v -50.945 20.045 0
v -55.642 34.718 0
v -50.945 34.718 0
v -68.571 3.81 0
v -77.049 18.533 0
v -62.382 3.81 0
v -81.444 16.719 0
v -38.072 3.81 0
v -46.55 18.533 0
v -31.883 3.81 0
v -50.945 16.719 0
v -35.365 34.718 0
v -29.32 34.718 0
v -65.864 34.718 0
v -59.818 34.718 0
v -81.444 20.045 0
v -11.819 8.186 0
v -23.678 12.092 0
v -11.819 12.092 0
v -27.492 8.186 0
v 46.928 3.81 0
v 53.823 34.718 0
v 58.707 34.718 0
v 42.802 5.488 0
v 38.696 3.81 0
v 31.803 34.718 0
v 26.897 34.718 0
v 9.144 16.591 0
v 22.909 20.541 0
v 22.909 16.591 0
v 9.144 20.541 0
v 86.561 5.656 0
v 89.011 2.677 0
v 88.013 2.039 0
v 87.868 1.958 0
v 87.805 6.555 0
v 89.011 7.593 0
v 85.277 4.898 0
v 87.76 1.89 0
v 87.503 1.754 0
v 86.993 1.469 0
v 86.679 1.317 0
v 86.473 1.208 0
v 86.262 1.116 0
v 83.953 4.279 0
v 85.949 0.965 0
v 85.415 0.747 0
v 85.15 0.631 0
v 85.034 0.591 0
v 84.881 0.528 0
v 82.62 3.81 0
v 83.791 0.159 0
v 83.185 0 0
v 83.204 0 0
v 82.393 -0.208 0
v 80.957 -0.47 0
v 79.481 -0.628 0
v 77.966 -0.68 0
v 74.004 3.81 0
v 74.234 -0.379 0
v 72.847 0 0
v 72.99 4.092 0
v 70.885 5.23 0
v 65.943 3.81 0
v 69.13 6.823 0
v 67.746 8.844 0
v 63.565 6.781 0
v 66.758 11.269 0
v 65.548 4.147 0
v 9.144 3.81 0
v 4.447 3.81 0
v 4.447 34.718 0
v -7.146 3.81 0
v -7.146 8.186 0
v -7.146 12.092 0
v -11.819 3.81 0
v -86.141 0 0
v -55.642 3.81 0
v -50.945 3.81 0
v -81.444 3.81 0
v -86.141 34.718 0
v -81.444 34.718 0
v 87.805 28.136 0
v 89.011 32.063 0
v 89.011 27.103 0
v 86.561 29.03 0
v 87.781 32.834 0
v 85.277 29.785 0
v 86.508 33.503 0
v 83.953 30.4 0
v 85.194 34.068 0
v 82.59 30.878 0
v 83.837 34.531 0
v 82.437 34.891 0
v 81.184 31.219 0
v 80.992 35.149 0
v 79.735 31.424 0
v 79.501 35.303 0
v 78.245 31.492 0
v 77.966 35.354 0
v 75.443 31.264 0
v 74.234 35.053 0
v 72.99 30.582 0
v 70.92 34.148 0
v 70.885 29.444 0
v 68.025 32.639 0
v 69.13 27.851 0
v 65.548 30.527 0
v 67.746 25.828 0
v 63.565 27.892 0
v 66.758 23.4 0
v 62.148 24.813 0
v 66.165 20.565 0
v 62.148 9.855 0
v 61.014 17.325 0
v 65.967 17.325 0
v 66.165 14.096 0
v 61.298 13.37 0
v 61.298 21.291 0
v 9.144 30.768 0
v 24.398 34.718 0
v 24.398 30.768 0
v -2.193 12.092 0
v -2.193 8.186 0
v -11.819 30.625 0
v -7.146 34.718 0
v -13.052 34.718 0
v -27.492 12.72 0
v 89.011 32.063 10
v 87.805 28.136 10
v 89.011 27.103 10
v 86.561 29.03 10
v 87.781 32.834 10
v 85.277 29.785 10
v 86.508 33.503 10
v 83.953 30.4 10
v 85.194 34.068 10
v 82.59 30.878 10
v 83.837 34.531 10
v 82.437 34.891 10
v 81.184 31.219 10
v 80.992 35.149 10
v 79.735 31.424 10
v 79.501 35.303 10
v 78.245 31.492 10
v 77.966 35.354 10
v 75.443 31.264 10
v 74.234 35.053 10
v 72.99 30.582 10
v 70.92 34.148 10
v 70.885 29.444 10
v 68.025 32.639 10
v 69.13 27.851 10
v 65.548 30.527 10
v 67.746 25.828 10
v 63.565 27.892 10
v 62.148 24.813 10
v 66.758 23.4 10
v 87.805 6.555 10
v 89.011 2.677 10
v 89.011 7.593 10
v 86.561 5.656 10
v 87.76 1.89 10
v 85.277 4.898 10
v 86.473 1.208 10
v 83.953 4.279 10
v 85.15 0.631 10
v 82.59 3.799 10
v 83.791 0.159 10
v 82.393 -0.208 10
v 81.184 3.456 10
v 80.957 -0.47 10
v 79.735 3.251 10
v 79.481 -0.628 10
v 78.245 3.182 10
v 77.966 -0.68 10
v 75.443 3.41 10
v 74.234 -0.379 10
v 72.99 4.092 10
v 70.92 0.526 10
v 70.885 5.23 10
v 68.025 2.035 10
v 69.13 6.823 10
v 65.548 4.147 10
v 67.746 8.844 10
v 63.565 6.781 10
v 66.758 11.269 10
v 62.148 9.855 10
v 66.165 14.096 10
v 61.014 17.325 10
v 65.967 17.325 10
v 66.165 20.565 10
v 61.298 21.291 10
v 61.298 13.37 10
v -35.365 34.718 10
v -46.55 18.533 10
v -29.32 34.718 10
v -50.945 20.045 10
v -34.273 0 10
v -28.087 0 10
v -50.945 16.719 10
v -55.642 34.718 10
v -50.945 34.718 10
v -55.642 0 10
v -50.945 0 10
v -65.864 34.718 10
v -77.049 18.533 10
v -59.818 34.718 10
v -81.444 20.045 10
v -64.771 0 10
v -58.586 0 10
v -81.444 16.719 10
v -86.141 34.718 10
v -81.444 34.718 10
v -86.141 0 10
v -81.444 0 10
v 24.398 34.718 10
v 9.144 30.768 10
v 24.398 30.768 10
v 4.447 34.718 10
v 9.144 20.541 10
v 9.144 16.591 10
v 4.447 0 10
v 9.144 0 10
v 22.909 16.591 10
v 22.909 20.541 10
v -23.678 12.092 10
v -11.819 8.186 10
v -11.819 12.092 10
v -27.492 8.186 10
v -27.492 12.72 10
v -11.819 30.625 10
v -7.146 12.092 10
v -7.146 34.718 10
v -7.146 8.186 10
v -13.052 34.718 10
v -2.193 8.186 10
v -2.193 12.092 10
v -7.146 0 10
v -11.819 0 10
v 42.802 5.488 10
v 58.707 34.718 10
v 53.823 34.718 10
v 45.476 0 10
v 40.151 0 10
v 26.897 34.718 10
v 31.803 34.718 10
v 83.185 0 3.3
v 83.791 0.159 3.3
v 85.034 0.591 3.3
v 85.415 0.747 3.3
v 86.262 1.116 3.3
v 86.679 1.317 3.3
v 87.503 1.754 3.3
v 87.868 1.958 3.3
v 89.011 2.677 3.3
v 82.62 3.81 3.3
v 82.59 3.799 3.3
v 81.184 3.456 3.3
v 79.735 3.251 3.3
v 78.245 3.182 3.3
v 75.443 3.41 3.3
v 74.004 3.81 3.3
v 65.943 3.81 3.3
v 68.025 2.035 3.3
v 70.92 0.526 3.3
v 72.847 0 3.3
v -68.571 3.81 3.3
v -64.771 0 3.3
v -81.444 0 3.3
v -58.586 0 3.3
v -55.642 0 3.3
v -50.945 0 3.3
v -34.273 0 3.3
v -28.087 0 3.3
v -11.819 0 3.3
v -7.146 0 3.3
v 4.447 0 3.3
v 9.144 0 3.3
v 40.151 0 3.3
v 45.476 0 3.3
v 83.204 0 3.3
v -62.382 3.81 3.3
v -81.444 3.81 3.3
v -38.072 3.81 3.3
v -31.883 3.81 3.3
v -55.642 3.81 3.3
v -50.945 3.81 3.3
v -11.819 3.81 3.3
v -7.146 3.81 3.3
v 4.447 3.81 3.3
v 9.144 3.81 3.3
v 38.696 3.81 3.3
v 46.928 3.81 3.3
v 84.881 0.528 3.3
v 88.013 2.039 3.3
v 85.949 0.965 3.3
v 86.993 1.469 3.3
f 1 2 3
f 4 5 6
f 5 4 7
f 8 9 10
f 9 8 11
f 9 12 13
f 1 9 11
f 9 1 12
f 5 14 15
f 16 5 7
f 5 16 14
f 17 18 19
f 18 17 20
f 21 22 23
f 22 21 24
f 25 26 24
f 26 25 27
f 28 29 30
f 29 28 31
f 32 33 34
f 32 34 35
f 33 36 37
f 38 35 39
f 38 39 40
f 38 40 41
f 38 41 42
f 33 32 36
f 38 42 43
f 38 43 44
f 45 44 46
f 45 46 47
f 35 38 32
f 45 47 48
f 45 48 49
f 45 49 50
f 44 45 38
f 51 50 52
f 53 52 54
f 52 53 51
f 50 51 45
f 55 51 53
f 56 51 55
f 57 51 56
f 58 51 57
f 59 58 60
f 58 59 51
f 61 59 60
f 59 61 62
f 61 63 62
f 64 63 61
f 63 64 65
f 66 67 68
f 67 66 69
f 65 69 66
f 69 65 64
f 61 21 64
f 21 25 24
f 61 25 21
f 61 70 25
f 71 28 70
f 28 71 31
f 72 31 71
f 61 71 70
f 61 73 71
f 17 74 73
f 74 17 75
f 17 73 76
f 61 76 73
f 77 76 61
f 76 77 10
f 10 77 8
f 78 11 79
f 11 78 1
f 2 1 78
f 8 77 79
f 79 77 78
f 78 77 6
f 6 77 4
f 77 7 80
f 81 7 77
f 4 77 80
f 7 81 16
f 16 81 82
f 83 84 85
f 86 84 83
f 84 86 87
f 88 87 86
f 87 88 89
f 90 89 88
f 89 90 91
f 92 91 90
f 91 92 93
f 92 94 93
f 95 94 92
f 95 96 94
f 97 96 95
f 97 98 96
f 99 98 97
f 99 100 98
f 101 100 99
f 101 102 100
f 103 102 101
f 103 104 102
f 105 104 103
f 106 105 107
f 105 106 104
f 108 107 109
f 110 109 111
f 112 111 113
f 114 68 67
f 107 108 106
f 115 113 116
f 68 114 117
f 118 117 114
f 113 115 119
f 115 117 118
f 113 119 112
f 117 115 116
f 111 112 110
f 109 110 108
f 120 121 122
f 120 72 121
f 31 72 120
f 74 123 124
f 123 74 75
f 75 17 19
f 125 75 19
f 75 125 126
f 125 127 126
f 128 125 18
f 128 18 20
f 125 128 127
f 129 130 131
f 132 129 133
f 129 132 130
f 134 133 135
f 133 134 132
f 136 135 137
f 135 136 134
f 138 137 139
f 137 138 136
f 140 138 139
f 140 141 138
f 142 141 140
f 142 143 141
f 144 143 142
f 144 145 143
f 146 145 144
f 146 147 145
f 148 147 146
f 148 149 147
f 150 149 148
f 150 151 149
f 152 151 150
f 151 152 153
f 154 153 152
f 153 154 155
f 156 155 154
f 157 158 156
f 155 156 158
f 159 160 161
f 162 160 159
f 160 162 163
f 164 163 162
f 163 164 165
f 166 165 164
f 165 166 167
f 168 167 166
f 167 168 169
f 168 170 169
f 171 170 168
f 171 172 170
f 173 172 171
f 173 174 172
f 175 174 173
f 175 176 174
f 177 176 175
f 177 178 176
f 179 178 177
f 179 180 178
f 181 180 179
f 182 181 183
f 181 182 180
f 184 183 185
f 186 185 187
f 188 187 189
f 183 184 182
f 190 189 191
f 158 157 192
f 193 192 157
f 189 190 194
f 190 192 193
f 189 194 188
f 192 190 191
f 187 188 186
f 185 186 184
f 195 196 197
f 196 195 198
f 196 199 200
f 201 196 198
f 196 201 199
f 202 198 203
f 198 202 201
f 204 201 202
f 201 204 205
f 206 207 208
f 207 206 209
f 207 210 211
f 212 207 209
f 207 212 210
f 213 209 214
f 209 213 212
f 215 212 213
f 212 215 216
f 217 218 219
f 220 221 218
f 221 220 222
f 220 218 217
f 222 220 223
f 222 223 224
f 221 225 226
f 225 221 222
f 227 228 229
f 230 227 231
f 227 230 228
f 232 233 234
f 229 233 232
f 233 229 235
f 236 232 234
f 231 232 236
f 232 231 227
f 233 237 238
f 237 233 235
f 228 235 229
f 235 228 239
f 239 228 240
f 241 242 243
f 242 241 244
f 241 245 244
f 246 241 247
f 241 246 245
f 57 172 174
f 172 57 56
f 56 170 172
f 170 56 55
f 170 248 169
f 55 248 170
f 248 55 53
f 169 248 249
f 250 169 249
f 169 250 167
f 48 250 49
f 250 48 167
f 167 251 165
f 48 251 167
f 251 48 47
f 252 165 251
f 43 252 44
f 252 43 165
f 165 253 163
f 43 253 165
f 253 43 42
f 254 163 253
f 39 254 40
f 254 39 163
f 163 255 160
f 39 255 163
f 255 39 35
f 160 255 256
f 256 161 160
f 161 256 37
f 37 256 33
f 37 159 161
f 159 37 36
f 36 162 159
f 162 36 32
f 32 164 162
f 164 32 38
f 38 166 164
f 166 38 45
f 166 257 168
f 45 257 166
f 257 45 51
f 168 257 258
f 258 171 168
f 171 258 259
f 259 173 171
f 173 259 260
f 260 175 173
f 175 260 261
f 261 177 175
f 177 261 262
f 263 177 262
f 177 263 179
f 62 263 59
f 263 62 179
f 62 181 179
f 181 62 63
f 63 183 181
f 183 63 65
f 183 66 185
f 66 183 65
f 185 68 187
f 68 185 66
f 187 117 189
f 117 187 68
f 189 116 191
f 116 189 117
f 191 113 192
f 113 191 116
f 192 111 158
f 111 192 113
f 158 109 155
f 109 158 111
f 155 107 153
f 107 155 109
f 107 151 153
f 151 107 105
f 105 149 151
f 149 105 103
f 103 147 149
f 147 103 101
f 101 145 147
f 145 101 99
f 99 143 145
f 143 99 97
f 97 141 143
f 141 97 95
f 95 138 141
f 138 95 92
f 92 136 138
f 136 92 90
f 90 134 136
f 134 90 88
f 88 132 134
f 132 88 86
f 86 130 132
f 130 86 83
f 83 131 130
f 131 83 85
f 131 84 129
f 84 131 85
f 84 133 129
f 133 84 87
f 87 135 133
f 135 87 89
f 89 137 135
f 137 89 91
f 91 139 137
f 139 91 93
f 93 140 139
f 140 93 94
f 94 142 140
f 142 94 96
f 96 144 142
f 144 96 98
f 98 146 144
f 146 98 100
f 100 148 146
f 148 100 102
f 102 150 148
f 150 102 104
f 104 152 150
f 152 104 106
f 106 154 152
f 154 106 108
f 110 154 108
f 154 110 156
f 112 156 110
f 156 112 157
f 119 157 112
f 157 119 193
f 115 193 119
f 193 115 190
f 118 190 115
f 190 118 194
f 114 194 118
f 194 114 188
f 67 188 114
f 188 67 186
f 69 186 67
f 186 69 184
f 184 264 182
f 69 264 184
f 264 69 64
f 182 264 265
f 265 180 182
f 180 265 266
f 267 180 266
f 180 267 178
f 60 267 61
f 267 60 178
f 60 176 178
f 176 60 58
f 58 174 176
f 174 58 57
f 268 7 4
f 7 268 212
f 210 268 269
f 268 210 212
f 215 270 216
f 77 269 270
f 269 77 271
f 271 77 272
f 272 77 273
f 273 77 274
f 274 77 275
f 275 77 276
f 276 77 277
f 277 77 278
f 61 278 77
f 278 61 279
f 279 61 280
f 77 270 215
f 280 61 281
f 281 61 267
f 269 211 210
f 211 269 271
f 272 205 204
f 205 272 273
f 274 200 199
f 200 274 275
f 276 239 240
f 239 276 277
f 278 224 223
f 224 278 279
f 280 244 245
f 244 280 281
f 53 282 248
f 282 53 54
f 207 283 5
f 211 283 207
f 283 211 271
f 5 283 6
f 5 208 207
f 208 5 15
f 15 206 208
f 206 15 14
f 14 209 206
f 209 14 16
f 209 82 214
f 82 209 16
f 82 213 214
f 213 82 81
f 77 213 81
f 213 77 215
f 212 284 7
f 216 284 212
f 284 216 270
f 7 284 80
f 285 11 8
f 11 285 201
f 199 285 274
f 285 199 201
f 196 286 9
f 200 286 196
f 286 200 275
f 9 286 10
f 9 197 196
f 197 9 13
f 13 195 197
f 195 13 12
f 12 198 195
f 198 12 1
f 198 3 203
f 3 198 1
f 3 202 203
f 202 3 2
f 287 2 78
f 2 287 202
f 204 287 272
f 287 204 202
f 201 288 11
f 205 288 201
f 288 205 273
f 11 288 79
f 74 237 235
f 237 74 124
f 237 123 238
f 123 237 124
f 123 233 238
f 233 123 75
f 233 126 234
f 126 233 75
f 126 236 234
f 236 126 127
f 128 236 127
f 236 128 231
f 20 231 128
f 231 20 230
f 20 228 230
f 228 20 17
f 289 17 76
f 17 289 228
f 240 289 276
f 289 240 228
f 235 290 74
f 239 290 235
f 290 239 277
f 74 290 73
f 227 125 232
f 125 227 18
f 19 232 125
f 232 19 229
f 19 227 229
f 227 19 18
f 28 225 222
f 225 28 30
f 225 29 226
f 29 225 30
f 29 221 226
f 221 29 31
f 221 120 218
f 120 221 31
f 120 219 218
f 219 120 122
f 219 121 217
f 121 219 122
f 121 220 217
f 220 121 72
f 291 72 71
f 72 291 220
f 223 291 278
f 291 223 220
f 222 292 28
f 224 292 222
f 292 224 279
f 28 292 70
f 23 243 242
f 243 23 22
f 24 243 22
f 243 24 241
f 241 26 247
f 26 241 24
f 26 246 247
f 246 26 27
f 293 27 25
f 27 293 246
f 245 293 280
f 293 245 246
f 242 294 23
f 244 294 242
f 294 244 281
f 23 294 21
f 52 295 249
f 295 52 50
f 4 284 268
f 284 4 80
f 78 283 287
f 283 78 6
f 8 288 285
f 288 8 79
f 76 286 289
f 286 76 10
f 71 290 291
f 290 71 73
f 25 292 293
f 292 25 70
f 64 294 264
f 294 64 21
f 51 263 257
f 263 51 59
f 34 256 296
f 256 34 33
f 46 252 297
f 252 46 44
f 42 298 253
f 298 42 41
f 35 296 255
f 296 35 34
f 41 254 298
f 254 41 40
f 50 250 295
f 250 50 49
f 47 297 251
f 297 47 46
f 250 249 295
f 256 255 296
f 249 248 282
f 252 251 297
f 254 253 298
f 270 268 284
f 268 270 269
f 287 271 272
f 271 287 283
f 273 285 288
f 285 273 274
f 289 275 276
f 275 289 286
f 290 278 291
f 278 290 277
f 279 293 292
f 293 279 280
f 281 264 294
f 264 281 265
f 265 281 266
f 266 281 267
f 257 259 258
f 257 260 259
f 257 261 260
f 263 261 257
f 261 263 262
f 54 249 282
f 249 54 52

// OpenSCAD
//Set the text to render
textstring="KK4FVC";

//Font name, e.g. "Libration Sans", "Aldo", depends on what is available on the platform. In the customizer,choose from about 700 Google Fonts. For an overview please refer: http://www.google.com/fonts
fontname="Passion One"; //[ABeeZee,Abel,Abril Fatface,Aclonica,Acme,Actor,Adamina,Advent Pro,Aguafina Script,Akronim,Aladin,Aldrich,Alef,Alegreya,Alegreya Sans,Alegreya Sans SC,Alegreya SC,Alex Brush,Alfa Slab One,Alice,Alike,Alike Angular,Allan,Allerta,Allerta Stencil,Allura,Almendra,Almendra Display,Almendra SC,Amarante,Amaranth,Amatic SC,Amethysta,Amiri,Anaheim,Andada,Andika,Angkor,Annie Use Your Telescope,Anonymous Pro,Antic,Antic Didone,Antic Slab,Anton,Arapey,Arbutus,Arbutus Slab,Architects Daughter,Archivo Black,Archivo Narrow,Arimo,Arizonia,Armata,Artifika,Arvo,Asap,Asset,Astloch,Asul,Atomic Age,Aubrey,Audiowide,Autour One,Average,Average Sans,Averia Gruesa Libre,Averia Libre,Averia Sans Libre,Averia Serif Libre,Bad Script,Balthazar,Bangers,Basic,Battambang,Baumans,Bayon,Belgrano,Belleza,BenchNine,Bentham,Berkshire Swash,Bevan,Bigelow Rules,Bigshot One,Bilbo,Bilbo Swash Caps,Bitter,Black Ops One,Bokor,Bonbon,Boogaloo,Bowlby One,Bowlby One SC,Brawler,Bree Serif,Bubblegum Sans,Bubbler One,Buda,Buenard,Butcherman,Butterfly Kids,Cabin,Cabin Condensed,Cabin Sketch,Caesar Dressing,Cagliostro,Calligraffitti,Cambay,Cambo,Candal,Cantarell,Cantata One,Cantora One,Capriola,Cardo,Carme,Carrois Gothic,Carrois Gothic SC,Carter One,Caudex,Cedarville Cursive,Ceviche One,Changa One,Chango,Chau Philomene One,Chela One,Chelsea Market,Chenla,Cherry Cream Soda,Cherry Swash,Chewy,Chicle,Chivo,Cinzel,Cinzel Decorative,Clicker Script,Coda,Coda Caption,Codystar,Combo,Comfortaa,Coming Soon,Concert One,Condiment,Content,Contrail One,Convergence,Cookie,Copse,Corben,Courgette,Cousine,Coustard,Covered By Your Grace,Crafty Girls,Creepster,Crete Round,Crimson Text,Croissant One,Crushed,Cuprum,Cutive,Cutive Mono,Damion,Dancing Script,Dangrek,Dawning of a New Day,Days One,Dekko,Delius,Delius Swash Caps,Delius Unicase,Della Respira,Denk One,Devonshire,Dhurjati,Didact Gothic,Diplomata,Diplomata SC,Domine,Donegal One,Doppio One,Dorsa,Dosis,Dr Sugiyama,Droid Sans,Droid Sans Mono,Droid Serif,Duru Sans,Dynalight,Eagle Lake,Eater,EB Garamond,Economica,Ek Mukta,Electrolize,Elsie,Elsie Swash Caps,Emblema One,Emilys Candy,Engagement,Englebert,Enriqueta,Erica One,Esteban,Euphoria Script,Ewert,Exo,Exo 2,Expletus Sans,Fanwood Text,Fascinate,Fascinate Inline,Faster One,Fasthand,Fauna One,Federant,Federo,Felipa,Fenix,Finger Paint,Fira Mono,Fira Sans,Fjalla One,Fjord One,Flamenco,Flavors,Fondamento,Fontdiner Swanky,Forum,Francois One,Freckle Face,Fredericka the Great,Fredoka One,Freehand,Fresca,Frijole,Fruktur,Fugaz One,Gabriela,Gafata,Galdeano,Galindo,Gentium Basic,Gentium Book Basic,Geo,Geostar,Geostar Fill,Germania One,GFS Didot,GFS Neohellenic,Gidugu,Gilda Display,Give You Glory,Glass Antiqua,Glegoo,Gloria Hallelujah,Goblin One,Gochi Hand,Gorditas,Goudy Bookletter 1911,Graduate,Grand Hotel,Gravitas One,Great Vibes,Griffy,Gruppo,Gudea,Gurajada,Habibi,Halant,Hammersmith One,Hanalei,Hanalei Fill,Handlee,Hanuman,Happy Monkey,Headland One,Henny Penny,Herr Von Muellerhoff,Hind,Holtwood One SC,Homemade Apple,Homenaje,Iceberg,Iceland,IM Fell Double Pica,IM Fell Double Pica SC,IM Fell DW Pica,IM Fell DW Pica SC,IM Fell English,IM Fell English SC,IM Fell French Canon,IM Fell French Canon SC,IM Fell Great Primer,IM Fell Great Primer SC,Imprima,Inconsolata,Inder,Indie Flower,Inika,Irish Grover,Istok Web,Italiana,Italianno,Jacques Francois,Jacques Francois Shadow,Jim Nightshade,Jockey One,Jolly Lodger,Josefin Sans,Josefin Slab,Joti One,Judson,Julee,Julius Sans One,Junge,Jura,Just Another Hand,Just Me Again Down Here,Kalam,Kameron,Kantumruy,Karla,Karma,Kaushan Script,Kavoon,Kdam Thmor,Keania One,Kelly Slab,Kenia,Khand,Khmer,Khula,Kite One,Knewave,Kotta One,Koulen,Kranky,Kreon,Kristi,Krona One,La Belle Aurore,Laila,Lakki Reddy,Lancelot,Lateef,Lato,League Script,Leckerli One,Ledger,Lekton,Lemon,Liberation Sans,Libre Baskerville,Life Savers,Lilita One,Lily Script One,Limelight,Linden Hill,Lobster,Lobster Two,Londrina Outline,Londrina Shadow,Londrina Sketch,Londrina Solid,Lora,Love Ya Like A Sister,Loved by the King,Lovers Quarrel,Luckiest Guy,Lusitana,Lustria,Macondo,Macondo Swash Caps,Magra,Maiden Orange,Mako,Mallanna,Mandali,Marcellus,Marcellus SC,Marck Script,Margarine,Marko One,Marmelad,Martel Sans,Marvel,Mate,Mate SC,Maven Pro,McLaren,Meddon,MedievalSharp,Medula One,Megrim,Meie Script,Merienda,Merienda One,Merriweather,Merriweather Sans,Metal,Metal Mania,Metamorphous,Metrophobic,Michroma,Milonga,Miltonian,Miltonian Tattoo,Miniver,Miss Fajardose,Modak,Modern Antiqua,Molengo,Molle,Monda,Monofett,Monoton,Monsieur La Doulaise,Montaga,Montez,Montserrat,Montserrat Alternates,Montserrat Subrayada,Moul,Moulpali,Mountains of Christmas,Mouse Memoirs,Mr Bedfort,Mr Dafoe,Mr De Haviland,Mrs Saint Delafield,Mrs Sheppards,Muli,Mystery Quest,Neucha,Neuton,New Rocker,News Cycle,Niconne,Nixie One,Nobile,Nokora,Norican,Nosifer,Nothing You Could Do,Noticia Text,Noto Sans,Noto Serif,Nova Cut,Nova Flat,Nova Mono,Nova Oval,Nova Round,Nova Script,Nova Slim,Nova Square,NTR,Numans,Nunito,Odor Mean Chey,Offside,Old Standard TT,Oldenburg,Oleo Script,Oleo Script Swash Caps,Open Sans,Open Sans Condensed,Oranienbaum,Orbitron,Oregano,Orienta,Original Surfer,Oswald,Over the Rainbow,Overlock,Overlock SC,Ovo,Oxygen,Oxygen Mono,Pacifico,Paprika,Parisienne,Passero One,Passion One,Pathway Gothic One,Patrick Hand,Patrick Hand SC,Patua One,Paytone One,Peddana,Peralta,Permanent Marker,Petit Formal Script,Petrona,Philosopher,Piedra,Pinyon Script,Pirata One,Plaster,Play,Playball,Playfair Display,Playfair Display SC,Podkova,Poiret One,Poller One,Poly,Pompiere,Pontano Sans,Port Lligat Sans,Port Lligat Slab,Prata,Preahvihear,Press Start 2P,Princess Sofia,Prociono,Prosto One,PT Mono,PT Sans,PT Sans Caption,PT Sans Narrow,PT Serif,PT Serif Caption,Puritan,Purple Purse,Quando,Quantico,Quattrocento,Quattrocento Sans,Questrial,Quicksand,Quintessential,Qwigley,Racing Sans One,Radley,Rajdhani,Raleway,Raleway Dots,Ramabhadra,Ramaraja,Rambla,Rammetto One,Ranchers,Rancho,Ranga,Rationale,Ravi Prakash,Redressed,Reenie Beanie,Revalia,Ribeye,Ribeye Marrow,Righteous,Risque,Roboto,Roboto Condensed,Roboto Slab,Rochester,Rock Salt,Rokkitt,Romanesco,Ropa Sans,Rosario,Rosarivo,Rouge Script,Rozha One,Rubik Mono One,Rubik One,Ruda,Rufina,Ruge Boogie,Ruluko,Rum Raisin,Ruslan Display,Russo One,Ruthie,Rye,Sacramento,Sail,Salsa,Sanchez,Sancreek,Sansita One,Sarina,Sarpanch,Satisfy,Scada,Scheherazade,Schoolbell,Seaweed Script,Sevillana,Seymour One,Shadows Into Light,Shadows Into Light Two,Shanti,Share,Share Tech,Share Tech Mono,Shojumaru,Short Stack,Siemreap,Sigmar One,Signika,Signika Negative,Simonetta,Sintony,Sirin Stencil,Six Caps,Skranji,Slabo 13px,Slabo 27px,Slackey,Smokum,Smythe,Sniglet,Snippet,Snowburst One,Sofadi One,Sofia,Sonsie One,Sorts Mill Goudy,Source Code Pro,Source Sans Pro,Source Serif Pro,Special Elite,Spicy Rice,Spinnaker,Spirax,Squada One,Sree Krushnadevaraya,Stalemate,Stalinist One,Stardos Stencil,Stint Ultra Condensed,Stint Ultra Expanded,Stoke,Strait,Sue Ellen Francisco,Sunshiney,Supermercado One,Suranna,Suravaram,Suwannaphum,Swanky and Moo Moo,Syncopate,Tangerine,Taprom,Tauri,Teko,Telex,Tenali Ramakrishna,Tenor Sans,Text Me One,The Girl Next Door,Tienne,Timmana,Tinos,Titan One,Titillium Web,Trade Winds,Trocchi,Trochut,Trykker,Tulpen One,Ubuntu,Ubuntu Condensed,Ubuntu Mono,Ultra,Uncial Antiqua,Underdog,Unica One,UnifrakturCook,UnifrakturMaguntia,Unkempt,Unlock,Unna,Vampiro One,Varela,Varela Round,Vast Shadow,Vesper Libre,Vibur,Vidaloka,Viga,Voces,Volkhov,Vollkorn,Voltaire,VT323,Waiting for the Sunrise,Wallpoet,Walter Turncoat,Warnes,Wellfleet,Wendy One,Wire One,Yanone Kaffeesatz,Yellowtail,Yeseva One,Yesteryear,Zeyada]

//Use a rounded base to connect all letters or use a connecting bar?
RoundedBase=0; //[0, 1]

//Shift the font up/down to connect i and j dots? Select "no" if you have no i or j in your text.
do_shift_font="automatic"; //[automatic,yes,no]

//Set font size in mm
textsize=38.1; 

//Text height (extrusion) in mm
textheight=10;

//Connecting bar height (extrusion in print direction) in percent of the text height
baseheight_percent=.33;
baseheight=textheight*baseheight_percent;

//Connecting bar thickness in percent of the font size
basethickness_percent=0.1;
basethickness=textsize*basethickness_percent;

//Amount to shift the font up/down to connect i and j dots for printing. 
font_catch_diacritical_sign=2.3; 

//Only for a rounded base: Base increase size to make letters meet, in percent of the textsize
base_radius_add_percent=.1;
base_radius_add=textsize*base_radius_add_percent;

/* [Hidden] */
//-------------------------------------------------------------------------------

iorj = [ for (i = [0 : len(textstring) - 1]) if (textstring[i]=="i" || textstring[i]=="j") 1 ];

dummy_cutoutlen=len(textstring)*textsize;

/*
Name and Text
Version F, March 2015
Written by MC Geisler (mcgenki at gmail dot com)

This is a proper configurable name plate, consisting of separate extruded letters. Use the variables to get the text you need.

Each letter and also the dots of 'i' and 'j' are connected together, so after printing it will not fall apart.

Use it to create mini name tags (the text in the picture is 9mm high) or big text sculptures!

Have fun!

License: Attribution 4.0 International (CC BY 4.0)

You are free to:
    Share - copy and redistribute the material in any medium or format
    Adapt - remix, transform, and build upon the material
    for any purpose, even commercially.
*/


    
module writetext(textstr, sizeit)
{
    text(textstr,size=sizeit*.9,font=fontname,halign="center",valign="baseline");
}

module RiseText(textstr, textsize,textheight) 
{

    linear_extrude(height=textheight,convexity = 10)
        writetext(textstr, textsize);

    //create base
    if(RoundedBase==0)
    {
        //base line to connect
        linear_extrude(height=baseheight, twist=0, slices=1, $fn=32) 
            hull()
                intersection()
                {
                    writetext(textstr, textsize);
                    
                    //translate([0,-textsize/2+basethickness/2+base_offset,0])
                    translate([0,basethickness/2,0])
                       square([dummy_cutoutlen,basethickness],center=true);
                }
              
        if ( (do_shift_font=="automatic" && iorj[0]==1) || do_shift_font=="yes")  
        {
            //connect i and j dots
            assign(delta=textsize/30*font_catch_diacritical_sign)
               intersection()
               {
                   //connect the dots but maybe too much in other locations
                   linear_extrude(height=baseheight/2,convexity = 10)
                        offset(delta=-delta)   
                            offset(delta=delta)
                                writetext(textstr, textsize);
               
                   //connect only vertical parts by shifting
                   linear_extrude(height=baseheight/2,convexity = 10)
                       for ( i = [-1 : 1] )
                           translate([0,i*delta,0])
                                writetext(textstr, textsize);
               }
       }

    }
    else        
    {
                linear_extrude(height=baseheight, twist=0, slices=1, $fn=32) 
                    offset(r = base_radius_add) 
                    {
                        writetext(textstr, textsize);
                    }
    }

}

RiseText(textstring,textsize,textheight);

